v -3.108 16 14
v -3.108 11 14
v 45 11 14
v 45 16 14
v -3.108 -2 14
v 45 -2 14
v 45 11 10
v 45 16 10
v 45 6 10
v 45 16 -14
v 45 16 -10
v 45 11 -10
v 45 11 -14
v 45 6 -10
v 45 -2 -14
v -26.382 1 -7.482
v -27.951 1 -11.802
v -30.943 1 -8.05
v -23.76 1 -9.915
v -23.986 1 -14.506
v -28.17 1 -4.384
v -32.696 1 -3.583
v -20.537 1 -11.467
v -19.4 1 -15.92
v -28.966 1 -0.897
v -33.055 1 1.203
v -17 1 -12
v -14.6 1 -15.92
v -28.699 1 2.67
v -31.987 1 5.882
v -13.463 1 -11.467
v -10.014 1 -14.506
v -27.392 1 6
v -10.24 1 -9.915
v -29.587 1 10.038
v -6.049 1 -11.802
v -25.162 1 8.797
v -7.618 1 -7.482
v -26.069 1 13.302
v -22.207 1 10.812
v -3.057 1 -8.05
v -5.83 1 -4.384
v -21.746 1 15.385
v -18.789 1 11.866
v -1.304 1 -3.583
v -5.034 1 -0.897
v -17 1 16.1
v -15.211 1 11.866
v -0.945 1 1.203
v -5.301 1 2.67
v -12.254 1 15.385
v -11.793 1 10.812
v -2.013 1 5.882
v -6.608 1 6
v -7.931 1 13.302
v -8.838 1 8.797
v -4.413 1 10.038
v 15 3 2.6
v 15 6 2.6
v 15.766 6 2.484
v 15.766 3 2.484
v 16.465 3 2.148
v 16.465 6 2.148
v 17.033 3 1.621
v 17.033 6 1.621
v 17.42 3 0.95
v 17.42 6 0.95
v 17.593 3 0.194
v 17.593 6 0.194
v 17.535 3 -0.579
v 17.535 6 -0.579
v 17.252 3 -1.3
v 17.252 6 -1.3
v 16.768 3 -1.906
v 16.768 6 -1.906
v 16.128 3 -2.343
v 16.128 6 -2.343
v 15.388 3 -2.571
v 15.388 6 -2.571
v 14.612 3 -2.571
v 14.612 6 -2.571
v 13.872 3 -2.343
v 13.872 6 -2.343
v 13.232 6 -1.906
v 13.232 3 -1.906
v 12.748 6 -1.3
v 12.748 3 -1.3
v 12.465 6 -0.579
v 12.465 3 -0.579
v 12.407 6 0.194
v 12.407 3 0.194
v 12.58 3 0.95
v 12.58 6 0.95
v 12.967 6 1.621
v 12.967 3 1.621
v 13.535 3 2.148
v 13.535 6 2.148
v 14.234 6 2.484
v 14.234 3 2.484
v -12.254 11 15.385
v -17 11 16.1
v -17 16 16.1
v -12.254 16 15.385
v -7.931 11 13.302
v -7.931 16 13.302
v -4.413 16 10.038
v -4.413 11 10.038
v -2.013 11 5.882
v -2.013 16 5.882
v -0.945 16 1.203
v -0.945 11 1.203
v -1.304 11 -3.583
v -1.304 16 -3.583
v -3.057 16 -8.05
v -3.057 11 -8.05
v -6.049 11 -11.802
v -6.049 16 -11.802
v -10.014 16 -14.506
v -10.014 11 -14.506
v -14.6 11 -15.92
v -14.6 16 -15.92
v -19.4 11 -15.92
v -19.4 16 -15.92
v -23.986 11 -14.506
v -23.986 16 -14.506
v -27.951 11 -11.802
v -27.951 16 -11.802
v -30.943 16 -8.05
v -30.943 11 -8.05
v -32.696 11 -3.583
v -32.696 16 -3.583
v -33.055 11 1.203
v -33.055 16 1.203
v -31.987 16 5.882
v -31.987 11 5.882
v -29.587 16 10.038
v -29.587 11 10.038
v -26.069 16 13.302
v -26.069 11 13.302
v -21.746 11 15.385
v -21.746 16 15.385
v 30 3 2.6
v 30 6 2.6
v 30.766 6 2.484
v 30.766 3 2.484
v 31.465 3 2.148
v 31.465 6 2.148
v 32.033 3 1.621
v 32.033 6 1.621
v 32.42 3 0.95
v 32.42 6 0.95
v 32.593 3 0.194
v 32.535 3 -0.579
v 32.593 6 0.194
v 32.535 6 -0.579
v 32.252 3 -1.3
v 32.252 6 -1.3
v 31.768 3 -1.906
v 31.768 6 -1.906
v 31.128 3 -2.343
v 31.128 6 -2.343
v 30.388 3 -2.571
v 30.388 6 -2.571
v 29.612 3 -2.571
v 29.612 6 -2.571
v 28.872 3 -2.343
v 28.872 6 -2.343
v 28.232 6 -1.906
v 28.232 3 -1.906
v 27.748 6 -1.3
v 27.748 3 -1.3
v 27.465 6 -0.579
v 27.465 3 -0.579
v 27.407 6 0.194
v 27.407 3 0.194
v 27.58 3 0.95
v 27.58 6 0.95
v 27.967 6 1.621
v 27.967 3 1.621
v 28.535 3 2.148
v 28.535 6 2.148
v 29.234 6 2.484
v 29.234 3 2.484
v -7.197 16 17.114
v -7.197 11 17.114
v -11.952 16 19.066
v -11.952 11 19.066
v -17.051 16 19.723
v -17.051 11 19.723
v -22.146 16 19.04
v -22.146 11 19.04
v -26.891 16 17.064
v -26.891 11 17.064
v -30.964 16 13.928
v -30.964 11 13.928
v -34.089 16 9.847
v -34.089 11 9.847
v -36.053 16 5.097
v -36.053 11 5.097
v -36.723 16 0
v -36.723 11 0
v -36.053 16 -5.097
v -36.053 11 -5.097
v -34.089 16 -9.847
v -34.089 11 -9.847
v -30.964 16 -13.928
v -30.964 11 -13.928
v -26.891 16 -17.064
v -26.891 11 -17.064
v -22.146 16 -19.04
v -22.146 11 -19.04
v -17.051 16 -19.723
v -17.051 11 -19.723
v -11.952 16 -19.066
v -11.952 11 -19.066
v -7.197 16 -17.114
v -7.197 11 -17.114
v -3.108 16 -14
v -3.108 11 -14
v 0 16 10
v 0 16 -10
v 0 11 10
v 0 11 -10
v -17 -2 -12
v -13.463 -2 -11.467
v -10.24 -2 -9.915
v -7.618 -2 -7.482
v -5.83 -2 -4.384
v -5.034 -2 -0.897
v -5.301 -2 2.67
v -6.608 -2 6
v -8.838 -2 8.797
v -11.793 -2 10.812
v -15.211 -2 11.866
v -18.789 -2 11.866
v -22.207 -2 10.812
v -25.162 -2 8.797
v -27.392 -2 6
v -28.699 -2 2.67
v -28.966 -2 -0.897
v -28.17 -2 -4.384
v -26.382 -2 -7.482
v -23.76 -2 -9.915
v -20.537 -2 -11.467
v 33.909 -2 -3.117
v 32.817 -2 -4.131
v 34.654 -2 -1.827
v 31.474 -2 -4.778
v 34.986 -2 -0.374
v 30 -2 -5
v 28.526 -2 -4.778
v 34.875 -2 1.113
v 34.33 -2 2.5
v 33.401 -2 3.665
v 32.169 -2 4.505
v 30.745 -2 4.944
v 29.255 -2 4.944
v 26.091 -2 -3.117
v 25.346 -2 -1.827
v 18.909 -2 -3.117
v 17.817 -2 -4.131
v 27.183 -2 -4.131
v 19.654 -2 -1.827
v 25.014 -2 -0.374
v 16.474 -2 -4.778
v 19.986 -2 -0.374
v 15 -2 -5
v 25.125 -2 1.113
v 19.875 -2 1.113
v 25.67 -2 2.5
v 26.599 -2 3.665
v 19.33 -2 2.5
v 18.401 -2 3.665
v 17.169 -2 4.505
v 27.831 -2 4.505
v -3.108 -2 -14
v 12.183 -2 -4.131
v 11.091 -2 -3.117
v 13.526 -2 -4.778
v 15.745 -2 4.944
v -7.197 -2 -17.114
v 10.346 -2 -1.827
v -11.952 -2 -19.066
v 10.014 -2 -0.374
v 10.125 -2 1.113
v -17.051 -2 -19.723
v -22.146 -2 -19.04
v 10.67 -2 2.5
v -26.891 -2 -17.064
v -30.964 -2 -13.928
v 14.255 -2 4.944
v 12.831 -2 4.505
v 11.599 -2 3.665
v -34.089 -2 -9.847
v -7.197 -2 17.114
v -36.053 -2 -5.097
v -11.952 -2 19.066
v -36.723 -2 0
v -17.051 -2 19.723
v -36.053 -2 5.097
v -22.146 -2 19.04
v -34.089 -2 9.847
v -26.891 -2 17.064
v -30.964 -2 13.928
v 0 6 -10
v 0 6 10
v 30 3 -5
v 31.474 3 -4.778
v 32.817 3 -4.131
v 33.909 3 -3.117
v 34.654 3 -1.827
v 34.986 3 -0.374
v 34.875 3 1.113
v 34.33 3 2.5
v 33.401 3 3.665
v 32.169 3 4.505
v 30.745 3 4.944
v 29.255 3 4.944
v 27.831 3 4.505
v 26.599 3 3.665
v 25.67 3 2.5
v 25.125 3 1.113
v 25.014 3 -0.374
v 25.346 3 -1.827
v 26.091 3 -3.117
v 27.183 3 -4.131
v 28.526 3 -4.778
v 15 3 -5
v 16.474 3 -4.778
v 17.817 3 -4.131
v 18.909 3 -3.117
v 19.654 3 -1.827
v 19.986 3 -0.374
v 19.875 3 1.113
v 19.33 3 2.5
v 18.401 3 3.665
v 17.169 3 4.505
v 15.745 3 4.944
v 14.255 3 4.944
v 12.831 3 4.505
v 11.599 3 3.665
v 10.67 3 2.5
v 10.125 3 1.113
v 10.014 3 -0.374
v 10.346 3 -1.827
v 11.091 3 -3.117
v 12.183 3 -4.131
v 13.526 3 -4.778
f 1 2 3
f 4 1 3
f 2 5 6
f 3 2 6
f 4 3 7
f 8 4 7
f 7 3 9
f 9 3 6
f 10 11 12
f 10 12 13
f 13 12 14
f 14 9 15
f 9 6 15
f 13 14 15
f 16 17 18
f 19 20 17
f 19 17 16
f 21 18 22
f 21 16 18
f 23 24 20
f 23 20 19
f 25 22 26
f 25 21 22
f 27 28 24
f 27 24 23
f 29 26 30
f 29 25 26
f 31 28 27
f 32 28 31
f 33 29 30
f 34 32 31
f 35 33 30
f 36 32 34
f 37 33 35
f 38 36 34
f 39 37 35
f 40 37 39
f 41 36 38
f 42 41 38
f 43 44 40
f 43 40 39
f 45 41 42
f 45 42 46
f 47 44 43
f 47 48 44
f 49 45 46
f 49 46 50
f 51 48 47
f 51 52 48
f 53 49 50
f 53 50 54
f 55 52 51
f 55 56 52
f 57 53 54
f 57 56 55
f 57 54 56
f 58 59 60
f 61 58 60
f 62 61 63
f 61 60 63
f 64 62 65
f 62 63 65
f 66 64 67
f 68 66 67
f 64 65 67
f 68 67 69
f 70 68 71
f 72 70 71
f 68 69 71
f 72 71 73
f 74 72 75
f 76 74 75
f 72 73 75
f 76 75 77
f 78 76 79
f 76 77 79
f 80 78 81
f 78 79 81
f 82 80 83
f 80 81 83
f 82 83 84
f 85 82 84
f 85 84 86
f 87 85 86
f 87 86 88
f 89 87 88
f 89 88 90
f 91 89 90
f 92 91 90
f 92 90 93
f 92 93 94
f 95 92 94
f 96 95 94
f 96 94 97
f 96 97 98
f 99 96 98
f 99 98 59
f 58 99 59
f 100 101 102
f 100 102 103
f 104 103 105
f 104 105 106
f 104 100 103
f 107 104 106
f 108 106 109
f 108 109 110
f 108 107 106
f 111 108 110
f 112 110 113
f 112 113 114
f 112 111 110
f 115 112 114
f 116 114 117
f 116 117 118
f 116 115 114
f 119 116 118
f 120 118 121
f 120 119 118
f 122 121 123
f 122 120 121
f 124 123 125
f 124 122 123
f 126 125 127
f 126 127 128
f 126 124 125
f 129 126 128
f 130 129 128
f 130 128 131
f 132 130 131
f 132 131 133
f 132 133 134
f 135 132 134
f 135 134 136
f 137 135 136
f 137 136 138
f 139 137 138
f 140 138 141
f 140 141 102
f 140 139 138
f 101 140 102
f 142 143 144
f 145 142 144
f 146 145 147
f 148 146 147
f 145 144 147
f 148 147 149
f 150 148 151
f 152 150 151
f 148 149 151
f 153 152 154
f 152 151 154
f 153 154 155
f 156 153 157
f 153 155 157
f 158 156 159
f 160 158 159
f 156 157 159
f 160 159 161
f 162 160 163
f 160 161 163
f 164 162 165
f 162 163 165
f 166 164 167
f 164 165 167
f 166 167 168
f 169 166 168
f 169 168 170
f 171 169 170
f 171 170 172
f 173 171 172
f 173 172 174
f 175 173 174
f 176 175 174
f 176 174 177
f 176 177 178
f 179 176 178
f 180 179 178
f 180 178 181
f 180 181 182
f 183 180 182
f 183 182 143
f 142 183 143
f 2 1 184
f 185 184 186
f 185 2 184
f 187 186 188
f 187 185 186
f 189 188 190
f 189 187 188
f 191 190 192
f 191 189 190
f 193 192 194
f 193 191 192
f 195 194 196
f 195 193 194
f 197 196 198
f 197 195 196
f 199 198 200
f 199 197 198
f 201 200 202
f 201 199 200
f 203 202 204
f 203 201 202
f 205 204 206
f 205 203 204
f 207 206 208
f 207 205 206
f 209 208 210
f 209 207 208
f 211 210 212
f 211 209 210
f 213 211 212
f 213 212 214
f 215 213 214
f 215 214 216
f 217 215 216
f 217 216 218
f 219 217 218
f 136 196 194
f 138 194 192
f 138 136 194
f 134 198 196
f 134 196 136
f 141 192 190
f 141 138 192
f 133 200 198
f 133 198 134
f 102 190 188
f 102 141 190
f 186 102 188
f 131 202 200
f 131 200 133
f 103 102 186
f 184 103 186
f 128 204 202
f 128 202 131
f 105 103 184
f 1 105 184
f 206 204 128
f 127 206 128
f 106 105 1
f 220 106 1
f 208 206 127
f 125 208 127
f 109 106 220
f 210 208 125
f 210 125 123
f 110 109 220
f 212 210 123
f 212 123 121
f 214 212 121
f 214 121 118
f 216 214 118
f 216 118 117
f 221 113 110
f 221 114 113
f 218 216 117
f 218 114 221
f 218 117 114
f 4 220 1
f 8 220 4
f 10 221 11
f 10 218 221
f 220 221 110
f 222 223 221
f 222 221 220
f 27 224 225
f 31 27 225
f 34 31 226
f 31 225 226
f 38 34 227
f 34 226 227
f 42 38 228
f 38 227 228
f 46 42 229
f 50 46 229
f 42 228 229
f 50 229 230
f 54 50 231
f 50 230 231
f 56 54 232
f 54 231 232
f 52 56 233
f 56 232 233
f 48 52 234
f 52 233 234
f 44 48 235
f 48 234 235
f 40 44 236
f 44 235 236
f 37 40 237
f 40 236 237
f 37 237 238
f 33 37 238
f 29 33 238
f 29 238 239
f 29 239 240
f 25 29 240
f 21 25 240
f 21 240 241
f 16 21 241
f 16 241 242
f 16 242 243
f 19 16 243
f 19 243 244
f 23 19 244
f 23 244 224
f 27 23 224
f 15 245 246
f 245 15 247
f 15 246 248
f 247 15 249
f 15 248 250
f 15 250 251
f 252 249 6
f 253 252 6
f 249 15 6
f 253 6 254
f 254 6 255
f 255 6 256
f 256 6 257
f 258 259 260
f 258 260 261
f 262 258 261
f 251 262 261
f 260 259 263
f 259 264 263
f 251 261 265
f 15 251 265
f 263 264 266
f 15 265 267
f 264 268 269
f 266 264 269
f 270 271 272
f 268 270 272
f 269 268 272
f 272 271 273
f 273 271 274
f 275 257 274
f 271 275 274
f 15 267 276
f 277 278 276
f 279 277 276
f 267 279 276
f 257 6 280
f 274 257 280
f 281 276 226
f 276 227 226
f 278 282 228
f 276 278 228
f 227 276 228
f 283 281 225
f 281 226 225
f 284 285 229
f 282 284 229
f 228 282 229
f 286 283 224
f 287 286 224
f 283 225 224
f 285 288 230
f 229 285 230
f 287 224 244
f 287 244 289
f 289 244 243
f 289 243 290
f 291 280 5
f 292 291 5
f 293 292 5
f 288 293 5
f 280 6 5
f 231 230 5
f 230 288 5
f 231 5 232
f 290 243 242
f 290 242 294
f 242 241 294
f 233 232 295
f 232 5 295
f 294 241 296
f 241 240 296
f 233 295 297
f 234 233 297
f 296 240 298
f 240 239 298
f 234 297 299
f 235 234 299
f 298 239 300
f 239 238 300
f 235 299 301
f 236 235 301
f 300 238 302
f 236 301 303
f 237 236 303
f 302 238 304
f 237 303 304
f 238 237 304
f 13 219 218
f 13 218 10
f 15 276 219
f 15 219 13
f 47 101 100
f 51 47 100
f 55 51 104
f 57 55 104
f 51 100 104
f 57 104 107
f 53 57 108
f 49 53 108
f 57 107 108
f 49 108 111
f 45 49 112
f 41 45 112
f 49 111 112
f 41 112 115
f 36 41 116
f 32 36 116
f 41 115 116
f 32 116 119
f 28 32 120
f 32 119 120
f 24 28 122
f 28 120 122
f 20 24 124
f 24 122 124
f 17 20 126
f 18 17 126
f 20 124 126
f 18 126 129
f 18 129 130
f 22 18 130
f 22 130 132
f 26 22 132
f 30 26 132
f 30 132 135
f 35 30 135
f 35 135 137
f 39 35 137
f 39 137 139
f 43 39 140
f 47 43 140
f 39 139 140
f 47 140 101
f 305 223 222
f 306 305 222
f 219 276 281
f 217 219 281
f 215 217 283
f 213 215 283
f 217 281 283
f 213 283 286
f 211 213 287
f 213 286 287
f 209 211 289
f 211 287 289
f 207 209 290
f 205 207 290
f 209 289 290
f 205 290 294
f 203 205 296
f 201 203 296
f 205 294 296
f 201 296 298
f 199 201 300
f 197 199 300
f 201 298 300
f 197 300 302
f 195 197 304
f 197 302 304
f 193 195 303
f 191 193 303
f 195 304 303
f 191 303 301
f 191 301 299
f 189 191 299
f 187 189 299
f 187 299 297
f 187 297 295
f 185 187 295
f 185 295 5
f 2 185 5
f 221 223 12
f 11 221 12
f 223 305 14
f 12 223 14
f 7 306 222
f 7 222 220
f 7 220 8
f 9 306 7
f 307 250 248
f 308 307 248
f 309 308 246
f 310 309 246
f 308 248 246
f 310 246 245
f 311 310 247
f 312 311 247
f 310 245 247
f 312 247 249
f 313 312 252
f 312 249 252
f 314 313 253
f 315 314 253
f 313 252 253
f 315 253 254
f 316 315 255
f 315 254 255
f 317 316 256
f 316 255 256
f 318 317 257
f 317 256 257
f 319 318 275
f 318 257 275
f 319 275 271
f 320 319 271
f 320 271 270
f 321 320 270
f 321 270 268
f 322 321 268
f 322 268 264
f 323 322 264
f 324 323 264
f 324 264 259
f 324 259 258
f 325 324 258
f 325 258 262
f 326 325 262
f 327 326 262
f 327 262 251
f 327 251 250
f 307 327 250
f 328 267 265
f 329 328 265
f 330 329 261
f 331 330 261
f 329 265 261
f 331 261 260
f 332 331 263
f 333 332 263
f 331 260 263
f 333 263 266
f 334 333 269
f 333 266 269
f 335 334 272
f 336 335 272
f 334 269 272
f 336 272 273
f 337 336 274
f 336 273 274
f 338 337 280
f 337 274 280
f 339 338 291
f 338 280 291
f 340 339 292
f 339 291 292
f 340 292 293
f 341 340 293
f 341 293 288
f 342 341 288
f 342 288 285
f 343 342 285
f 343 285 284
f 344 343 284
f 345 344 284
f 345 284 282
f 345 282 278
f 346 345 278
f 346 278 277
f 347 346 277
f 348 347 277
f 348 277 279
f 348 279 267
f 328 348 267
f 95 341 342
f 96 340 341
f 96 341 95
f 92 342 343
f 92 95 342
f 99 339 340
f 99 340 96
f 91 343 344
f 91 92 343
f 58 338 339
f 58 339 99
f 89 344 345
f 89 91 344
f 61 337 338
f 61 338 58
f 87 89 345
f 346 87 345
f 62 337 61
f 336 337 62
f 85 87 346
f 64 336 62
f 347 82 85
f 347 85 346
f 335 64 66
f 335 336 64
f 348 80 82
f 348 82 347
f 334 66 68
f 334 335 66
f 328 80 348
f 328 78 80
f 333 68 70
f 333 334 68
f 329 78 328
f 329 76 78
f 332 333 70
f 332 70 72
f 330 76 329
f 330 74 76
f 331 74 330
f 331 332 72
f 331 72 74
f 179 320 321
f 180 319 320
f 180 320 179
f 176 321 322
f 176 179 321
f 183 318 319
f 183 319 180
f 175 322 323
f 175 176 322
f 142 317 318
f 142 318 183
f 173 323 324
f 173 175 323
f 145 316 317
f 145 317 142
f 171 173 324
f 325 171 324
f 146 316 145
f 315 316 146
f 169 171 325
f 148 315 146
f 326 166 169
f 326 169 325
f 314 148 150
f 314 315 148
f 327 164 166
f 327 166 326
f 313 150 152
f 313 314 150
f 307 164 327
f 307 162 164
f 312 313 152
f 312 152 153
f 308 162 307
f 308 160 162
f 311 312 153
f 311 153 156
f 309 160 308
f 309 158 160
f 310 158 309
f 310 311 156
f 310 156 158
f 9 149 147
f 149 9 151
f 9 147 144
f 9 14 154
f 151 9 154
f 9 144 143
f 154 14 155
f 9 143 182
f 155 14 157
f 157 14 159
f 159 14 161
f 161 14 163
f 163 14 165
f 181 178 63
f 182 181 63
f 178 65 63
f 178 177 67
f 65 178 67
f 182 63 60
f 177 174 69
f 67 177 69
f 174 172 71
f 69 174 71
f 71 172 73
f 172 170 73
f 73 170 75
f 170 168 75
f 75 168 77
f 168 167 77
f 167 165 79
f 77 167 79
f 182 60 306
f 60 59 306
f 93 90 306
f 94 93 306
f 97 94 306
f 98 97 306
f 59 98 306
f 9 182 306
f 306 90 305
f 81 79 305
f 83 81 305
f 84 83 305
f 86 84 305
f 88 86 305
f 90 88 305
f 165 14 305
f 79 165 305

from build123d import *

# Parameters (mm, degrees)
SKETCH_1_R          = 16
EXTRUDE_2_DEPTH     = 11
CUT_EXTRUDE_1_DEPTH = 5
SKETCH_4_W          = 5
SKETCH_4_H          = 4
CUT_EXTRUDE_2_DEPTH = 11
SKETCH_5_R          = 2.6
CUT_EXTRUDE_3_DEPTH = 11
SKETCH_6_R          = 5
CUT_EXTRUDE_4_DEPTH = 3
SKETCH_8_R          = 16
SKETCH_8_R_2        = 12
EXTRUDE_5_DEPTH     = 1
EXTRUDE_START       = 2
SKETCH_9_R          = 12
SKETCH_9_R_2        = 5
EXTRUDE_6_DEPTH     = 2
SKETCH_10_R         = 16.1
CUT_EXTRUDE_5_DEPTH = 10
SKETCH_12_W         = 48.107556011
SKETCH_12_H         = 4
EXTRUDE_7_DEPTH     = 5
SKETCH_13_R         = 16.1
EXTRUDE_8_DEPTH     = 5


with BuildPart() as part:
    # 草图1 → 凸台-拉伸2 (new body)
    with BuildSketch(Plane(origin=(0, 0, 0), x_dir=(1, 0, 0), z_dir=(0, 1, 0))):
        with BuildLine():
            Line((50, 14), (-3.107556011, 14))
            ThreePointArc((-3.107556011, 14), (-36.723082923, 0), (-3.107556011, -14))
            Line((-3.107556011, -14), (50, -14))
            Line((50, -14), (50, -10))
            Line((50, -10), (50, 10))
            Line((50, 10), (50, 14))
        make_face()
        with Locations(Location((-17, 0, 0), (0, 0, 270))):
            Circle(SKETCH_1_R, mode=Mode.SUBTRACT)
    extrude(amount=EXTRUDE_2_DEPTH)

    # 草图3 → 切除-拉伸1 (cut)
    with BuildSketch(Plane(origin=(0, 11, 0), x_dir=(1, 0, 0), z_dir=(0, 1, 0))):
        Polygon((0, 0), (0, 10), (45, 10), (45, -10), (0, -10), align=None)
    extrude(amount=-CUT_EXTRUDE_1_DEPTH, mode=Mode.SUBTRACT)

    # 草图4 → 切除-拉伸2 (cut)
    with BuildSketch(Plane(origin=(0, 11, 0), x_dir=(1, 0, 0), z_dir=(0, 1, 0))):
        with Locations((47.5, 12)):
            Rectangle(SKETCH_4_W, SKETCH_4_H)
        Polygon((45, -14), (50, -14), (50, 10), (45, 10), (45, -10), align=None)
    extrude(amount=-CUT_EXTRUDE_2_DEPTH, mode=Mode.SUBTRACT)

    # 草图5 → 切除-拉伸3 (cut)
    with BuildSketch(Plane(origin=(0, 6, 0), x_dir=(1, 0, 0), z_dir=(0, 1, 0))):
        with Locations(Location((15, 0, 0), (0, 0, 270))):
            Circle(SKETCH_5_R)
        with Locations(Location((30, 0, 0), (0, 0, 270))):
            Circle(SKETCH_5_R)
    extrude(amount=-CUT_EXTRUDE_3_DEPTH, mode=Mode.SUBTRACT)

    # 草图6 → 切除-拉伸4 (cut)
    with BuildSketch(Plane.XZ):
        with Locations(Location((15, 0, 0), (0, 0, 270))):
            Circle(SKETCH_6_R)
        with Locations(Location((30, 0, 0), (0, 0, 270))):
            Circle(SKETCH_6_R)
    extrude(amount=-CUT_EXTRUDE_4_DEPTH, mode=Mode.SUBTRACT)

    # 草图8 → 凸台-拉伸5 (add)
    with BuildSketch(Plane(origin=(0, 0, 0), x_dir=(-1, 0, 0), z_dir=(0, -1, 0))):
        with Locations(Location((17, 0, 0), (0, 0, 90))):
            Circle(SKETCH_8_R)
        with Locations(Location((17, 0, 0), (0, 0, 90))):
            Circle(SKETCH_8_R_2, mode=Mode.SUBTRACT)
    extrude(amount=-EXTRUDE_5_DEPTH)

    # 草图9 → 凸台-拉伸6 (add)
    with BuildSketch(Plane.XZ.offset(EXTRUDE_START)):
        with BuildLine():
            Line((-3.107556011, 14), (45, 14))
            Line((45, 14), (45, -14))
            Line((45, -14), (-3.107556011, -14))
            ThreePointArc((-3.107556011, -14), (-36.723082923, 0), (-3.107556011, 14))
        make_face()
        with Locations(Location((-17, 0, 0), (0, 0, 270))):
            Circle(SKETCH_9_R, mode=Mode.SUBTRACT)
        with Locations(Location((15, 0, 0), (0, 0, 270))):
            Circle(SKETCH_9_R_2, mode=Mode.SUBTRACT)
        with Locations(Location((30, 0, 0), (0, 0, 270))):
            Circle(SKETCH_9_R_2, mode=Mode.SUBTRACT)
    extrude(amount=-EXTRUDE_6_DEPTH)

    # 草图10 → 切除-拉伸5 (cut)
    with BuildSketch(Plane(origin=(0, 11, 0), x_dir=(1, 0, 0), z_dir=(0, 1, 0))):
        with Locations(Location((-17, 0, 0), (0, 0, 270))):
            Circle(SKETCH_10_R)
    extrude(amount=-CUT_EXTRUDE_5_DEPTH, mode=Mode.SUBTRACT)

    # 草图12 → 凸台-拉伸7 (add)
    with BuildSketch(Plane(origin=(0, 11, 0), x_dir=(1, 0, 0), z_dir=(0, 1, 0))):
        with Locations((20.946221995, 12)):
            Rectangle(SKETCH_12_W, SKETCH_12_H)
        with Locations((20.946221995, -12)):
            Rectangle(SKETCH_12_W, SKETCH_12_H)
    extrude(amount=EXTRUDE_7_DEPTH)

    # 草图13 → 凸台-拉伸8 (add)
    with BuildSketch(Plane(origin=(0, 11, 0), x_dir=(1, 0, 0), z_dir=(0, 1, 0))):
        with BuildLine():
            Line((-3.107556011, 14), (0, 10))
            Line((0, 10), (0, -10))
            ThreePointArc((0, -10), (-36.559799946, -2.532632245), (-3.107556011, 14))
        make_face()
        with Locations(Location((-17, 0, 0), (0, 0, 270))):
            Circle(SKETCH_13_R, mode=Mode.SUBTRACT)
    extrude(amount=EXTRUDE_8_DEPTH)


solid = part.part
